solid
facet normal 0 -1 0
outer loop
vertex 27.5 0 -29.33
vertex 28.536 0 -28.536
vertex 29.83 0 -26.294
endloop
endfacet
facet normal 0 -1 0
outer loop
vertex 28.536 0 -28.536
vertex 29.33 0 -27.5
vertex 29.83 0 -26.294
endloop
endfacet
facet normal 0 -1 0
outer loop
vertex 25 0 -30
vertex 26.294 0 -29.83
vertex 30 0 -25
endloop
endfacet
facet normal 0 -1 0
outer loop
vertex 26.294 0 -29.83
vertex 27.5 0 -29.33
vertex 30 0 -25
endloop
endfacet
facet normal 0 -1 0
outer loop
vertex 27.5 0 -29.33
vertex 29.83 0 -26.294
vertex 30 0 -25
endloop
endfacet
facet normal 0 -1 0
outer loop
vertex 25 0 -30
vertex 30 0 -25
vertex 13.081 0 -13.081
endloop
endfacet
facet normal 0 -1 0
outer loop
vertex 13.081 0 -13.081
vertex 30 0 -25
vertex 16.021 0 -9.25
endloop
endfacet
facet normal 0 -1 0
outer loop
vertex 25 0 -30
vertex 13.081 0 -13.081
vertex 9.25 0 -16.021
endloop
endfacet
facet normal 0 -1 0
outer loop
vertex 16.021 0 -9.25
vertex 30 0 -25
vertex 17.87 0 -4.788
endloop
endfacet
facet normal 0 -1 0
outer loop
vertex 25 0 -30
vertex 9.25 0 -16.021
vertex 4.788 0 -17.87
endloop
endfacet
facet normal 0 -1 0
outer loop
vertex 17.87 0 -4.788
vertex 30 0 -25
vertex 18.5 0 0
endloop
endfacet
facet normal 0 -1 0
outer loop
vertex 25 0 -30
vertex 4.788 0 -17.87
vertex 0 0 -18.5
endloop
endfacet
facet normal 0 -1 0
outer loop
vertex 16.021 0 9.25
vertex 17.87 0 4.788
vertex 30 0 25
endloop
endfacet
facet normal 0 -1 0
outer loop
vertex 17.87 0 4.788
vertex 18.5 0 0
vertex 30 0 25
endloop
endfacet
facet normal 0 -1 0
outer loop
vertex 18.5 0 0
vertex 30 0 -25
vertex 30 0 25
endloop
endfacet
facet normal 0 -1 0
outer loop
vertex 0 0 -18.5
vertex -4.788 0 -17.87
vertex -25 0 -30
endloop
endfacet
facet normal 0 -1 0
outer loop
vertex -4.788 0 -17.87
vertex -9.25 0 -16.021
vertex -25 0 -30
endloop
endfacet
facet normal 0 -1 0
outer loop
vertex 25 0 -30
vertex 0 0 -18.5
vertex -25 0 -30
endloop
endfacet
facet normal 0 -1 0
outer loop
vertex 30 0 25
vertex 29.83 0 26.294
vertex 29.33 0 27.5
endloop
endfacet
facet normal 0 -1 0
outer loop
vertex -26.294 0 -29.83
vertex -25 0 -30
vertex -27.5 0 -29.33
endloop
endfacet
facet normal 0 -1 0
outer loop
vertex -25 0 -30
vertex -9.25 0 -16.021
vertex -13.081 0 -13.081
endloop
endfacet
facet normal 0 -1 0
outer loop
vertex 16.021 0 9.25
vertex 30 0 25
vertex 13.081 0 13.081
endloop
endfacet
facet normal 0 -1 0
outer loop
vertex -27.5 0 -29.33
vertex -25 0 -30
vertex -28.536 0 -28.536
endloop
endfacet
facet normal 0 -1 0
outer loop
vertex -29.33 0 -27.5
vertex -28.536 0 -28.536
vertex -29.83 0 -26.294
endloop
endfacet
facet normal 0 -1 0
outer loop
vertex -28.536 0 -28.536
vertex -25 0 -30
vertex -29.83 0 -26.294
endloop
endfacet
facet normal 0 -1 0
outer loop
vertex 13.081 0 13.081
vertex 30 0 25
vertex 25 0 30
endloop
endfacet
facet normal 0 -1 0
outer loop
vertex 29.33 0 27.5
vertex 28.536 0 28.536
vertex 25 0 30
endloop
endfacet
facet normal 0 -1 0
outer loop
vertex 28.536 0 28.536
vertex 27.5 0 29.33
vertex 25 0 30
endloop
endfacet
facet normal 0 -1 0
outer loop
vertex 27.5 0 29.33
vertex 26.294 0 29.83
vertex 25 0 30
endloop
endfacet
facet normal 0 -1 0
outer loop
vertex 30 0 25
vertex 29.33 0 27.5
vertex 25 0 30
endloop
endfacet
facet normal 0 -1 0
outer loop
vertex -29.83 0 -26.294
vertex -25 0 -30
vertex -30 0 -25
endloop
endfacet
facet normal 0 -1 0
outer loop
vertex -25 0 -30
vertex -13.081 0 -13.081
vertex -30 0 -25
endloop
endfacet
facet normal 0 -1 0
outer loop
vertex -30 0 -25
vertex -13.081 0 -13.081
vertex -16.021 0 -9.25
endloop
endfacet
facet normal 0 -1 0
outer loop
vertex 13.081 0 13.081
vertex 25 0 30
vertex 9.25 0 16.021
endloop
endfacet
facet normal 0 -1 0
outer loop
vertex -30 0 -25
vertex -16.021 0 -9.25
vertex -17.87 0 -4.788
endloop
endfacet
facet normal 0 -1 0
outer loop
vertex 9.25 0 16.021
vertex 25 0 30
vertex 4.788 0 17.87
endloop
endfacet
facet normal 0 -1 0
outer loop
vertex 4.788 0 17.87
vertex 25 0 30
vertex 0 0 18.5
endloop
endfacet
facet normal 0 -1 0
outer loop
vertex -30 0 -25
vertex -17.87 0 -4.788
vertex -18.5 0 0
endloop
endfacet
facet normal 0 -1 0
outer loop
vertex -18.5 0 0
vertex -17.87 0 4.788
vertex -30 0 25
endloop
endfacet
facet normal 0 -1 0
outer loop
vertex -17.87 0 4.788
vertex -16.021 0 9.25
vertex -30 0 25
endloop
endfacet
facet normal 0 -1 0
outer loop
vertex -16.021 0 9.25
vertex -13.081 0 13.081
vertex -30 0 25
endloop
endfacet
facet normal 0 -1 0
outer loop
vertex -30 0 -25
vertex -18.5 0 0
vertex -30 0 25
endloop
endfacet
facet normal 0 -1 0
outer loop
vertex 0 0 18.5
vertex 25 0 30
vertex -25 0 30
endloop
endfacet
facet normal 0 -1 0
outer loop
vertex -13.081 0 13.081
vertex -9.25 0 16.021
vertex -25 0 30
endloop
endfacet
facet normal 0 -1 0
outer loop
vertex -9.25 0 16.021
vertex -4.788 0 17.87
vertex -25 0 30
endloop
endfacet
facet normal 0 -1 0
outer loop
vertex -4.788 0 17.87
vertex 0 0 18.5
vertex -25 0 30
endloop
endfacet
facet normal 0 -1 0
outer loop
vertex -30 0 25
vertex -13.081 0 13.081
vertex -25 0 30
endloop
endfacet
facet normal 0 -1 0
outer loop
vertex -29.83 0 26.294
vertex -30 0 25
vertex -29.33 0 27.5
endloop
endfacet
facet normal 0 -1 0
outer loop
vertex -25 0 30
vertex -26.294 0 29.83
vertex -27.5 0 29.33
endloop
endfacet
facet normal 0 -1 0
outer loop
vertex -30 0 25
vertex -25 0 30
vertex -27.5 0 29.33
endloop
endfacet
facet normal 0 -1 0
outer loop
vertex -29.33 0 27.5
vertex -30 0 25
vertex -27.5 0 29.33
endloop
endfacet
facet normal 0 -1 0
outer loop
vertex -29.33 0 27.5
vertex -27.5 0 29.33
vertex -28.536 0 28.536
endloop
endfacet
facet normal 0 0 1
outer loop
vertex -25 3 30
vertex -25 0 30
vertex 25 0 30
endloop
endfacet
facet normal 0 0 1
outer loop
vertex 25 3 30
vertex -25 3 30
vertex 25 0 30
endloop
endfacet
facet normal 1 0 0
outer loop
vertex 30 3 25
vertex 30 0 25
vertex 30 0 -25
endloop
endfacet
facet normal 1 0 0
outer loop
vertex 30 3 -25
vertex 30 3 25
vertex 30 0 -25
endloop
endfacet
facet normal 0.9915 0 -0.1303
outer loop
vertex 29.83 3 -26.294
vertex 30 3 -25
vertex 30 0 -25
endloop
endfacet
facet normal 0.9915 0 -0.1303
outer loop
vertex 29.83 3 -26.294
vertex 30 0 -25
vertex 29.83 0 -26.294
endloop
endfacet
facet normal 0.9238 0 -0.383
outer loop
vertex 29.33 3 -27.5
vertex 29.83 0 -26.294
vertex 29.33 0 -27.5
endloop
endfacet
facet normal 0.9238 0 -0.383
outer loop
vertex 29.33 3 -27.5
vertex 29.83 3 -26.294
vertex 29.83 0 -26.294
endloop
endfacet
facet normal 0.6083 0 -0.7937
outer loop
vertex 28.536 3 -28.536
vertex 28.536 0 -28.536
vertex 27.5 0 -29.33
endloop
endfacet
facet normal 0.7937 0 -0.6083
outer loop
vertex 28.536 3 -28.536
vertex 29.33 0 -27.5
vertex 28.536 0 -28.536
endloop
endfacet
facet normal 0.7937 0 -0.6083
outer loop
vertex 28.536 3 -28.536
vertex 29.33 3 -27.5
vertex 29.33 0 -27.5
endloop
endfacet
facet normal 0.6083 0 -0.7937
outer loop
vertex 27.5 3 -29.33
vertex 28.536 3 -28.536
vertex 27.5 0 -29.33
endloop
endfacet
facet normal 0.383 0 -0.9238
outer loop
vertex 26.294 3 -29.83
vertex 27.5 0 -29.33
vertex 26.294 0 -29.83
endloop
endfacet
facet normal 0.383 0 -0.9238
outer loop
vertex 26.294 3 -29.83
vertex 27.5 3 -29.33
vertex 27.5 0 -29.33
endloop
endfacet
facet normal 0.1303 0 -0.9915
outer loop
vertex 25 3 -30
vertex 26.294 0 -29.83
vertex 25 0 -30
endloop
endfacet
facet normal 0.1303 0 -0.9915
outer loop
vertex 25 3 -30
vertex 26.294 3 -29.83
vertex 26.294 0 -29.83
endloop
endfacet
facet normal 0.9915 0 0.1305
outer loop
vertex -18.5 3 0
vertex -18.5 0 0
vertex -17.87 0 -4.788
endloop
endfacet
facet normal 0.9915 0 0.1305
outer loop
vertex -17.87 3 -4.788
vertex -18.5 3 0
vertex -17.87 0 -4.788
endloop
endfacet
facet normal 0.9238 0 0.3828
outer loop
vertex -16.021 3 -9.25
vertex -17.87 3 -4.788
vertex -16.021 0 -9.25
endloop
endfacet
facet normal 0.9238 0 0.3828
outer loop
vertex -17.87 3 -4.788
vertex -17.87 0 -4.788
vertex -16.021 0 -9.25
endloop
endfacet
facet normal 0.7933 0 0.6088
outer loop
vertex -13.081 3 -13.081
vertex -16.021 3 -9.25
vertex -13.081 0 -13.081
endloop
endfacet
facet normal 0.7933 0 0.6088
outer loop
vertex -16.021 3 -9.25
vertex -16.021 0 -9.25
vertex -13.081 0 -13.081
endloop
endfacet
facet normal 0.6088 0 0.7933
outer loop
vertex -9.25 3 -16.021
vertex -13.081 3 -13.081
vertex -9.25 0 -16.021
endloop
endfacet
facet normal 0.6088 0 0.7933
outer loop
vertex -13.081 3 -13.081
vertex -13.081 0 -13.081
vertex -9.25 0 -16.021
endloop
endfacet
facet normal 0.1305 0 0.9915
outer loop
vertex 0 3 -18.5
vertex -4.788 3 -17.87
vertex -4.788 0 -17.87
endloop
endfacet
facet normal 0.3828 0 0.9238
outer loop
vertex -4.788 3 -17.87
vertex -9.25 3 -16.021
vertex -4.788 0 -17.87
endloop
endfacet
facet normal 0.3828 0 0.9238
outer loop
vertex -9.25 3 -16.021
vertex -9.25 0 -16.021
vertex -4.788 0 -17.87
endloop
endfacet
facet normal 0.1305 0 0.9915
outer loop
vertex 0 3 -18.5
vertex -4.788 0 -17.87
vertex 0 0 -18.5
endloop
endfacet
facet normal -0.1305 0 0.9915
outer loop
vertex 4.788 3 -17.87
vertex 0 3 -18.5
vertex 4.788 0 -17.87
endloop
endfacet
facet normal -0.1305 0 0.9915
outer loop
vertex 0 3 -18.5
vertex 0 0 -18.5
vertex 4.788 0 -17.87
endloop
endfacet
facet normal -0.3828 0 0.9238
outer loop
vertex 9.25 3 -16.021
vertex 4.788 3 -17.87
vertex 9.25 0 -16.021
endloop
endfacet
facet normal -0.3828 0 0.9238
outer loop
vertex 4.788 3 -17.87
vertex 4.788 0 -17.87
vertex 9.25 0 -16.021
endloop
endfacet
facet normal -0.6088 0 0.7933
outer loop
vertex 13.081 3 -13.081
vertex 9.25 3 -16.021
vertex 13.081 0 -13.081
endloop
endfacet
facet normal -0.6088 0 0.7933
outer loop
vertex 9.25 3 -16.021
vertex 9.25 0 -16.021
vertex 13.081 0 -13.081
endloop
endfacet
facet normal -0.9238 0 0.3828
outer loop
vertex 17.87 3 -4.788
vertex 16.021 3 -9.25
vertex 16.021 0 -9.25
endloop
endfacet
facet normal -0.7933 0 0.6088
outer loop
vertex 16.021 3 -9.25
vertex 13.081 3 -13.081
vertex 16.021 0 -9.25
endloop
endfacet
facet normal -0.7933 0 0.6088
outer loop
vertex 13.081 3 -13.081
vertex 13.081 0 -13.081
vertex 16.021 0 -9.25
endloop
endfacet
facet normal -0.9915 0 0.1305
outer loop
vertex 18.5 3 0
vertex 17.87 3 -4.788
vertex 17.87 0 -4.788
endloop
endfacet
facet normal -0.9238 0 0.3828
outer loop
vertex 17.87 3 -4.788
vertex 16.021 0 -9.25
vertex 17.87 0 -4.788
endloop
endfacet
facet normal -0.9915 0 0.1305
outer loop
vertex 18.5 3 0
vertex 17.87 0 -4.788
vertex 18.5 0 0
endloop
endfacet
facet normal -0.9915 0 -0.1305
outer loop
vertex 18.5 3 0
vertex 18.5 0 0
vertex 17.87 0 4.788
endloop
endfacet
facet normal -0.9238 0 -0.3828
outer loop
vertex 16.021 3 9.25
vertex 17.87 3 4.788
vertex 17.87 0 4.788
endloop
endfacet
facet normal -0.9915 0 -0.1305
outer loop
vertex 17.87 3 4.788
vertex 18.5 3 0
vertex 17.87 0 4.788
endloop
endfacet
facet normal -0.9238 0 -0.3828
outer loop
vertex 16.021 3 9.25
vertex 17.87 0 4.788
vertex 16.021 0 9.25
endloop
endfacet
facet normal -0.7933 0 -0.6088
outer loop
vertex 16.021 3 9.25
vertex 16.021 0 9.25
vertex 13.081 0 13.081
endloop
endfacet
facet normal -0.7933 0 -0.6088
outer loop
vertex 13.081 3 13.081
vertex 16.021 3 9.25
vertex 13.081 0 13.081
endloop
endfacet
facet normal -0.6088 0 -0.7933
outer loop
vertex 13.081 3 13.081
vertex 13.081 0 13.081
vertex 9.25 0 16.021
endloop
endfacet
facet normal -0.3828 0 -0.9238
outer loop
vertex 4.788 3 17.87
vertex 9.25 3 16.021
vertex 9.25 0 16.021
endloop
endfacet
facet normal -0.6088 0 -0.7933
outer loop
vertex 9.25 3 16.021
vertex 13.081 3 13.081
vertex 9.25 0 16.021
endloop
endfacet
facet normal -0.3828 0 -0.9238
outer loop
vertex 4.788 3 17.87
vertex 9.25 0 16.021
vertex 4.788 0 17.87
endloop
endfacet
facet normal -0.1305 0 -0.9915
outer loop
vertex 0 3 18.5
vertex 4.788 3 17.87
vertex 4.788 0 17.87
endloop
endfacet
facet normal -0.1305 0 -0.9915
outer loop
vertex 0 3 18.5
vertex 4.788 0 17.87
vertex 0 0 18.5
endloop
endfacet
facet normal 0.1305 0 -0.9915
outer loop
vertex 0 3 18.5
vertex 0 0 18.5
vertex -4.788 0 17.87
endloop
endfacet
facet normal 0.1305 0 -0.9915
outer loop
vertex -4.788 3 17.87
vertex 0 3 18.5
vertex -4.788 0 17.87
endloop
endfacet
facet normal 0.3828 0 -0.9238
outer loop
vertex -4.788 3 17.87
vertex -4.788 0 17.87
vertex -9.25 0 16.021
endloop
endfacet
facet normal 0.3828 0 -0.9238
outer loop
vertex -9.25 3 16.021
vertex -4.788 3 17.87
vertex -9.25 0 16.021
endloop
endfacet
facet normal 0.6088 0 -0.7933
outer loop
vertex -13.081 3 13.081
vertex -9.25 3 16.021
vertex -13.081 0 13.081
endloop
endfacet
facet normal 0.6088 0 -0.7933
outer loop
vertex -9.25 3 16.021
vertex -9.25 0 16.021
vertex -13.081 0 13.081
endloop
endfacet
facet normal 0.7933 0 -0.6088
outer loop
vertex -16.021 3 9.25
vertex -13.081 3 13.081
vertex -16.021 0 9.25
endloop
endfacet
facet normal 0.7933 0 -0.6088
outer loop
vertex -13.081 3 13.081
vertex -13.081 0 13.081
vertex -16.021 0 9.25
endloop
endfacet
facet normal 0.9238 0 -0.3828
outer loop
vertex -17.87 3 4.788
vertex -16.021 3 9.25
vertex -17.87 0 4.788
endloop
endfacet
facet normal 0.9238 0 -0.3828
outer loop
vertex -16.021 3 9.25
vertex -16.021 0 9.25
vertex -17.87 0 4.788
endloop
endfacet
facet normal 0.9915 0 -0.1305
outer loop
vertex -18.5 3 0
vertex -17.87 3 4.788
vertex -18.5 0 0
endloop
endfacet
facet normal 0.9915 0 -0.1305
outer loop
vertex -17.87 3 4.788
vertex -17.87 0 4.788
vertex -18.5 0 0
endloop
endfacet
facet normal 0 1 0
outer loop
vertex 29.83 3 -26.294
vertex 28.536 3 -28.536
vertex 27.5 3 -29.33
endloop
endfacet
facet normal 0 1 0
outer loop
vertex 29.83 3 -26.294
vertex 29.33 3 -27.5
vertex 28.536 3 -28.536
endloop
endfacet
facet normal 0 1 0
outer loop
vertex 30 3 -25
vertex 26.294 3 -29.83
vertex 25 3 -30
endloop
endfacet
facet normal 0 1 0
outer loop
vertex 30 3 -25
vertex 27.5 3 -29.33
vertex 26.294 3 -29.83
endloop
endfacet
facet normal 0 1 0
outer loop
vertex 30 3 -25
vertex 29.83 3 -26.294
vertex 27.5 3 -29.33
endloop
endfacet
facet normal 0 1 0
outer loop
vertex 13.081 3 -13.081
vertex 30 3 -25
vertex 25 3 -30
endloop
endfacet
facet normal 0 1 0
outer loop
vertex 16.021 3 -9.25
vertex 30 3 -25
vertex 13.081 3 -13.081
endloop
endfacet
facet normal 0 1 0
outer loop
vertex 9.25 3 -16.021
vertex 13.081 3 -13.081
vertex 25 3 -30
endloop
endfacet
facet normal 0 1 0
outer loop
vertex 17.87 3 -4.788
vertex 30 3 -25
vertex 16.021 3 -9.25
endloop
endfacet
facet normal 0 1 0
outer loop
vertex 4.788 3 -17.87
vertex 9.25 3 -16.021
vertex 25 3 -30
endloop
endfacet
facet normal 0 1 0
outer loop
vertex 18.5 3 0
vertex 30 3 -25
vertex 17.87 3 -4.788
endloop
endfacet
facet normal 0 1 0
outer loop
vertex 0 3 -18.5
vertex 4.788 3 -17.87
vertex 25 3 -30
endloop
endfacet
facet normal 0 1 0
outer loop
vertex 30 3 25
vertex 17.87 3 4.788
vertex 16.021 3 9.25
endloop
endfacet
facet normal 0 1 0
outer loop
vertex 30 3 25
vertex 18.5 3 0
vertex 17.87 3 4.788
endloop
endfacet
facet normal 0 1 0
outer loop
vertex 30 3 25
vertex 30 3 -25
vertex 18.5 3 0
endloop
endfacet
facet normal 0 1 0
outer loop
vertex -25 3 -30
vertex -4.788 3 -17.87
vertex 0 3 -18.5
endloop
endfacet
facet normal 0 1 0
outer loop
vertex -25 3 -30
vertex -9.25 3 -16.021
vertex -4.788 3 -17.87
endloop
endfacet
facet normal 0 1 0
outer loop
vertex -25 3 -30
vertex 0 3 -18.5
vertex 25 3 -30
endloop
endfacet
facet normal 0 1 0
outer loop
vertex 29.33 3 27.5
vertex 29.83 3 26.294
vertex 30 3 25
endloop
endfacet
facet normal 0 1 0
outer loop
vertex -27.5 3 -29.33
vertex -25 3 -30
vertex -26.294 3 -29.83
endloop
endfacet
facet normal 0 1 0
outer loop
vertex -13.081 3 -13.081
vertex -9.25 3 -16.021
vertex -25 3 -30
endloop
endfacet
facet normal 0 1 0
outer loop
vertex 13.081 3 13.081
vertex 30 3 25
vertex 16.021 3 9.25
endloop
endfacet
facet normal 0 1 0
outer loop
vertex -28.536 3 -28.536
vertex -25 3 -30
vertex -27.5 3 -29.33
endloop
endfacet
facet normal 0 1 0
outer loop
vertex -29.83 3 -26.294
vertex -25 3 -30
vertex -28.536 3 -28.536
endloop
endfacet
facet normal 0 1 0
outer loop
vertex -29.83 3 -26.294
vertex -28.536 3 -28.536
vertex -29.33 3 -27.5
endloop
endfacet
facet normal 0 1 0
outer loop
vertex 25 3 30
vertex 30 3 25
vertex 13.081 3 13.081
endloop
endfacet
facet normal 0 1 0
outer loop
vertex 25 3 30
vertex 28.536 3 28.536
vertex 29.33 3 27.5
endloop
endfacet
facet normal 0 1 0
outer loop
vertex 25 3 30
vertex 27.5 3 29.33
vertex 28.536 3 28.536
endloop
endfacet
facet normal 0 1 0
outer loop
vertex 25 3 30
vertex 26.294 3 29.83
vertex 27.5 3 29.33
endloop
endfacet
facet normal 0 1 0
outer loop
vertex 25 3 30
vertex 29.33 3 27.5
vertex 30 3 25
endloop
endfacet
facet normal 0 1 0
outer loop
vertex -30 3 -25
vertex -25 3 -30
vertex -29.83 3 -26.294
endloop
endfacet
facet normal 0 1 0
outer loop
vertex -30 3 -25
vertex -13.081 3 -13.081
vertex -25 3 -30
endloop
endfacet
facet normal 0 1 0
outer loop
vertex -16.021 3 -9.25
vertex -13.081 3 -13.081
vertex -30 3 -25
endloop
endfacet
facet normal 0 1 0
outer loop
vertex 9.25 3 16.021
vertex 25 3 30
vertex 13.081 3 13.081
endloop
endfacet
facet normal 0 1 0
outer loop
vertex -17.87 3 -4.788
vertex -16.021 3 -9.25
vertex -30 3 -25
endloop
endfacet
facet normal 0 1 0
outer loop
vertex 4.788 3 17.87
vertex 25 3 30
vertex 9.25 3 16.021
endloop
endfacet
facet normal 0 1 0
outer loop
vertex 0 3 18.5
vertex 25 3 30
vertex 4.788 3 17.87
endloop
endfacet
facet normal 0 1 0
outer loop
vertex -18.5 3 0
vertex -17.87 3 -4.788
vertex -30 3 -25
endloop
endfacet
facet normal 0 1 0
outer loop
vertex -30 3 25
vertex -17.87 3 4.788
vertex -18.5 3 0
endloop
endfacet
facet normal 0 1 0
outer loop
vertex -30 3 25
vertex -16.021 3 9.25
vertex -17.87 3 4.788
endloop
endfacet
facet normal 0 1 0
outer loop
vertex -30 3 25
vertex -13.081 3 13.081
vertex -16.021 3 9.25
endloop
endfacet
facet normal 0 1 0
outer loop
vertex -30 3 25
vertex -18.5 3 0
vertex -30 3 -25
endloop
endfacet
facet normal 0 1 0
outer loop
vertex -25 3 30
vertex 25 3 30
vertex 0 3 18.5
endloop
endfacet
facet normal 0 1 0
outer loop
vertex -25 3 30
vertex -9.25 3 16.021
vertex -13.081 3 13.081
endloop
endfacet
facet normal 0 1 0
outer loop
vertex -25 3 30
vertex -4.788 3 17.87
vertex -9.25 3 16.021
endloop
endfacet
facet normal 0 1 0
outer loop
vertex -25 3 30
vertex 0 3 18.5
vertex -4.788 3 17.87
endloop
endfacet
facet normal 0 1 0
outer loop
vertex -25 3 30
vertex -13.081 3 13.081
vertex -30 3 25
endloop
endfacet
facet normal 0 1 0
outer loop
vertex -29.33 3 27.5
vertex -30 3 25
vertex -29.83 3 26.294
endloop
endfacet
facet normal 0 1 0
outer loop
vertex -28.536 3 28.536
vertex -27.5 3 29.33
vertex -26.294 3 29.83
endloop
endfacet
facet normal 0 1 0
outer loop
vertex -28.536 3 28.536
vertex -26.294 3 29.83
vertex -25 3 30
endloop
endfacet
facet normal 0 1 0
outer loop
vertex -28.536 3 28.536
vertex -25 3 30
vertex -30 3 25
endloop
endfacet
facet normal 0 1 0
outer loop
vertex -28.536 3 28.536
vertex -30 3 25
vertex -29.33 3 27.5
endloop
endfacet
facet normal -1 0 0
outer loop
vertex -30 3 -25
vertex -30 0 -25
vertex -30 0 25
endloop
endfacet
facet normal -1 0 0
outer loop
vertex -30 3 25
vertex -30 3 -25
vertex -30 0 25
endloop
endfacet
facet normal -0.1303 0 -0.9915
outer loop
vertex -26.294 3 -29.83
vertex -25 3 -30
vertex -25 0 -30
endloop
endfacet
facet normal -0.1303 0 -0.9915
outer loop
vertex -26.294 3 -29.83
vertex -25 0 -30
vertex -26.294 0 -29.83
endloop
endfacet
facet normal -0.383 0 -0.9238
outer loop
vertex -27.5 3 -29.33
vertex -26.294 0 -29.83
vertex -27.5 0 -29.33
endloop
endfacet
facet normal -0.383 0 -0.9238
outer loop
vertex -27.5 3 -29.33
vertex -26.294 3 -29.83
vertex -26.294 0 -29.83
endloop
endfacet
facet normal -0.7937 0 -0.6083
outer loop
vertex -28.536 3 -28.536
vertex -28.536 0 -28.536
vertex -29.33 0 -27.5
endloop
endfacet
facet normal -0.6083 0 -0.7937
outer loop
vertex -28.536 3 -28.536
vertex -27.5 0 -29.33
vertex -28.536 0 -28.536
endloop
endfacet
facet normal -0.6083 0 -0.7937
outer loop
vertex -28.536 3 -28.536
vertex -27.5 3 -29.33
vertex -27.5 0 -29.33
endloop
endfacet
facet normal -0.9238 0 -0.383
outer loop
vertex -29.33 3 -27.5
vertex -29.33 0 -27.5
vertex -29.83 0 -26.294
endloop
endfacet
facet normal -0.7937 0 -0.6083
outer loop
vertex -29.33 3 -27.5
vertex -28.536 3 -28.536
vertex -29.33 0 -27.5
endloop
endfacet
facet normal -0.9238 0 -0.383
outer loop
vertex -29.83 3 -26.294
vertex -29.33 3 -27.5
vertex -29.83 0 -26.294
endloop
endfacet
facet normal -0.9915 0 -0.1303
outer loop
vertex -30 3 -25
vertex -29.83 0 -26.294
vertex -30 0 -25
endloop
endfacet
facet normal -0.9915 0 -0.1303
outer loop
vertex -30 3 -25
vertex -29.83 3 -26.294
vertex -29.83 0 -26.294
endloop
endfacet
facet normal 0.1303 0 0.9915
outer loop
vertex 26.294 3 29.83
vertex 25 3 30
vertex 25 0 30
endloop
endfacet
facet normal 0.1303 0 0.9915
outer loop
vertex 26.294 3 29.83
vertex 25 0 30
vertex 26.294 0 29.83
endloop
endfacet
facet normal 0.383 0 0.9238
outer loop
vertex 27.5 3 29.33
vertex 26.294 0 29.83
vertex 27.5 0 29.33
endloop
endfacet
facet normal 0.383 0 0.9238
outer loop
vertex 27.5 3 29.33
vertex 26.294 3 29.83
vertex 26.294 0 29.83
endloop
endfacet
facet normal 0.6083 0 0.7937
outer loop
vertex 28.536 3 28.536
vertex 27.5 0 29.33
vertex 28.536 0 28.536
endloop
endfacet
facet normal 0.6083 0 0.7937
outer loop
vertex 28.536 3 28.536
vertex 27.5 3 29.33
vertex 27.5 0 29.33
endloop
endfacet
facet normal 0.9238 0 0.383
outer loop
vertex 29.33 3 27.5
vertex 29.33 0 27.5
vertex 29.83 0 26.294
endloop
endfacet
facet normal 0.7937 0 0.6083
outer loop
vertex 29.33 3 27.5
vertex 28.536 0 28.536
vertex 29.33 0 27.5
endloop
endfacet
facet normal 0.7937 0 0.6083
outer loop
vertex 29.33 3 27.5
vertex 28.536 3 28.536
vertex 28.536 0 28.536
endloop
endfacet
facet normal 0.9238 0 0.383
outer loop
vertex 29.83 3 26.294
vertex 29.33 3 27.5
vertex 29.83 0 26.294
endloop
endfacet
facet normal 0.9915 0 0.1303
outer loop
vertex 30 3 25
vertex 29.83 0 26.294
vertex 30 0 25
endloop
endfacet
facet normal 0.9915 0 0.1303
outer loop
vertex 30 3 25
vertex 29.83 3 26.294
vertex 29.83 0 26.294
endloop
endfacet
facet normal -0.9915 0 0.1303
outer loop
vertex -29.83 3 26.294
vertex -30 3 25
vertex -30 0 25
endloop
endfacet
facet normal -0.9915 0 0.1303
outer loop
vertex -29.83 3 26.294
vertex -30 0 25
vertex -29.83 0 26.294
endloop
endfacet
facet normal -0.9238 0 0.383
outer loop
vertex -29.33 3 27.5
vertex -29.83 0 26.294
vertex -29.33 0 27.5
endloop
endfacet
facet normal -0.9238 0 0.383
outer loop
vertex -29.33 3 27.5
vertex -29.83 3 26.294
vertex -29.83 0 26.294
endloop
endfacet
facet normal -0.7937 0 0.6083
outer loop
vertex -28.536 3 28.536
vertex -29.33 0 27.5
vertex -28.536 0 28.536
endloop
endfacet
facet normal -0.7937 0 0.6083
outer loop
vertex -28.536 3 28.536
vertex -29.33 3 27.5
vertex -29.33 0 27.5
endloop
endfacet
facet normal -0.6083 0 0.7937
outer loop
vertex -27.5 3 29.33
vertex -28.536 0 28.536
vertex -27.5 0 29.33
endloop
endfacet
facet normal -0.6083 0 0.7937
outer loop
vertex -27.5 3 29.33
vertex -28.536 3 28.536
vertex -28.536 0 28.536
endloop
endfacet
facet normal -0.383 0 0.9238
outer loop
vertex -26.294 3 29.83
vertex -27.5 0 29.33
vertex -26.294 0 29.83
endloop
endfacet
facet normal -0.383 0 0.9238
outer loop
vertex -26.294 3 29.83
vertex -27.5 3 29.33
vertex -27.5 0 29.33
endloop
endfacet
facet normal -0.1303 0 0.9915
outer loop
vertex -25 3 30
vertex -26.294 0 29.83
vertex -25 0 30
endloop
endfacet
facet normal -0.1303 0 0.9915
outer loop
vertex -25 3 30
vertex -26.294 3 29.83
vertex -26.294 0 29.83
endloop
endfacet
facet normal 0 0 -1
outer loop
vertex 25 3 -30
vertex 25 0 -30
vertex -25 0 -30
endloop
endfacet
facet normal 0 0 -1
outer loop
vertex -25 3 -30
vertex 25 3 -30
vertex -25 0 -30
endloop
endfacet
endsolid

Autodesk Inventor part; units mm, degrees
ref_plane "YZ Plane" through (0, 0, 0) normal (1, 0, 0) x (0, 1, 0)
ref_plane "XZ Plane" through (0, 0, 0) normal (0, 1, 0) x (-1, 0, 0)
ref_plane "XY Plane" through (0, 0, 0) normal (0, 0, 1) x (1, 0, 0)
sketch "Sketch1" plane through (0, 0, 0) normal (0, 1, 0) x (-1, 0, 0)
  circle A0 centre (0, 0) radius 18.5
  line L0 (30, 30) -> (-30, 30)
  line L1 (-30, 30) -> (-30, -30)
  line L2 (-30, -30) -> (30, -30)
  line L3 (30, -30) -> (30, 30)
  line L4 (30, 30) -> (-30, -30) construction
  line L5 (-30, 30) -> (30, -30) construction
  dimension "d0" = 37
  dimension "d1" = 60
  dimension "d2" = 60
extrude "Extrusion1" add sketch "Sketch1" along normal blind 3
fillet "Fillet1" radius 5 4 edges at (30, 1.5, 30) (30, 1.5, -30) (-30, 1.5, -30) (-30, 1.5, 30)
properties part number "rimsa"
